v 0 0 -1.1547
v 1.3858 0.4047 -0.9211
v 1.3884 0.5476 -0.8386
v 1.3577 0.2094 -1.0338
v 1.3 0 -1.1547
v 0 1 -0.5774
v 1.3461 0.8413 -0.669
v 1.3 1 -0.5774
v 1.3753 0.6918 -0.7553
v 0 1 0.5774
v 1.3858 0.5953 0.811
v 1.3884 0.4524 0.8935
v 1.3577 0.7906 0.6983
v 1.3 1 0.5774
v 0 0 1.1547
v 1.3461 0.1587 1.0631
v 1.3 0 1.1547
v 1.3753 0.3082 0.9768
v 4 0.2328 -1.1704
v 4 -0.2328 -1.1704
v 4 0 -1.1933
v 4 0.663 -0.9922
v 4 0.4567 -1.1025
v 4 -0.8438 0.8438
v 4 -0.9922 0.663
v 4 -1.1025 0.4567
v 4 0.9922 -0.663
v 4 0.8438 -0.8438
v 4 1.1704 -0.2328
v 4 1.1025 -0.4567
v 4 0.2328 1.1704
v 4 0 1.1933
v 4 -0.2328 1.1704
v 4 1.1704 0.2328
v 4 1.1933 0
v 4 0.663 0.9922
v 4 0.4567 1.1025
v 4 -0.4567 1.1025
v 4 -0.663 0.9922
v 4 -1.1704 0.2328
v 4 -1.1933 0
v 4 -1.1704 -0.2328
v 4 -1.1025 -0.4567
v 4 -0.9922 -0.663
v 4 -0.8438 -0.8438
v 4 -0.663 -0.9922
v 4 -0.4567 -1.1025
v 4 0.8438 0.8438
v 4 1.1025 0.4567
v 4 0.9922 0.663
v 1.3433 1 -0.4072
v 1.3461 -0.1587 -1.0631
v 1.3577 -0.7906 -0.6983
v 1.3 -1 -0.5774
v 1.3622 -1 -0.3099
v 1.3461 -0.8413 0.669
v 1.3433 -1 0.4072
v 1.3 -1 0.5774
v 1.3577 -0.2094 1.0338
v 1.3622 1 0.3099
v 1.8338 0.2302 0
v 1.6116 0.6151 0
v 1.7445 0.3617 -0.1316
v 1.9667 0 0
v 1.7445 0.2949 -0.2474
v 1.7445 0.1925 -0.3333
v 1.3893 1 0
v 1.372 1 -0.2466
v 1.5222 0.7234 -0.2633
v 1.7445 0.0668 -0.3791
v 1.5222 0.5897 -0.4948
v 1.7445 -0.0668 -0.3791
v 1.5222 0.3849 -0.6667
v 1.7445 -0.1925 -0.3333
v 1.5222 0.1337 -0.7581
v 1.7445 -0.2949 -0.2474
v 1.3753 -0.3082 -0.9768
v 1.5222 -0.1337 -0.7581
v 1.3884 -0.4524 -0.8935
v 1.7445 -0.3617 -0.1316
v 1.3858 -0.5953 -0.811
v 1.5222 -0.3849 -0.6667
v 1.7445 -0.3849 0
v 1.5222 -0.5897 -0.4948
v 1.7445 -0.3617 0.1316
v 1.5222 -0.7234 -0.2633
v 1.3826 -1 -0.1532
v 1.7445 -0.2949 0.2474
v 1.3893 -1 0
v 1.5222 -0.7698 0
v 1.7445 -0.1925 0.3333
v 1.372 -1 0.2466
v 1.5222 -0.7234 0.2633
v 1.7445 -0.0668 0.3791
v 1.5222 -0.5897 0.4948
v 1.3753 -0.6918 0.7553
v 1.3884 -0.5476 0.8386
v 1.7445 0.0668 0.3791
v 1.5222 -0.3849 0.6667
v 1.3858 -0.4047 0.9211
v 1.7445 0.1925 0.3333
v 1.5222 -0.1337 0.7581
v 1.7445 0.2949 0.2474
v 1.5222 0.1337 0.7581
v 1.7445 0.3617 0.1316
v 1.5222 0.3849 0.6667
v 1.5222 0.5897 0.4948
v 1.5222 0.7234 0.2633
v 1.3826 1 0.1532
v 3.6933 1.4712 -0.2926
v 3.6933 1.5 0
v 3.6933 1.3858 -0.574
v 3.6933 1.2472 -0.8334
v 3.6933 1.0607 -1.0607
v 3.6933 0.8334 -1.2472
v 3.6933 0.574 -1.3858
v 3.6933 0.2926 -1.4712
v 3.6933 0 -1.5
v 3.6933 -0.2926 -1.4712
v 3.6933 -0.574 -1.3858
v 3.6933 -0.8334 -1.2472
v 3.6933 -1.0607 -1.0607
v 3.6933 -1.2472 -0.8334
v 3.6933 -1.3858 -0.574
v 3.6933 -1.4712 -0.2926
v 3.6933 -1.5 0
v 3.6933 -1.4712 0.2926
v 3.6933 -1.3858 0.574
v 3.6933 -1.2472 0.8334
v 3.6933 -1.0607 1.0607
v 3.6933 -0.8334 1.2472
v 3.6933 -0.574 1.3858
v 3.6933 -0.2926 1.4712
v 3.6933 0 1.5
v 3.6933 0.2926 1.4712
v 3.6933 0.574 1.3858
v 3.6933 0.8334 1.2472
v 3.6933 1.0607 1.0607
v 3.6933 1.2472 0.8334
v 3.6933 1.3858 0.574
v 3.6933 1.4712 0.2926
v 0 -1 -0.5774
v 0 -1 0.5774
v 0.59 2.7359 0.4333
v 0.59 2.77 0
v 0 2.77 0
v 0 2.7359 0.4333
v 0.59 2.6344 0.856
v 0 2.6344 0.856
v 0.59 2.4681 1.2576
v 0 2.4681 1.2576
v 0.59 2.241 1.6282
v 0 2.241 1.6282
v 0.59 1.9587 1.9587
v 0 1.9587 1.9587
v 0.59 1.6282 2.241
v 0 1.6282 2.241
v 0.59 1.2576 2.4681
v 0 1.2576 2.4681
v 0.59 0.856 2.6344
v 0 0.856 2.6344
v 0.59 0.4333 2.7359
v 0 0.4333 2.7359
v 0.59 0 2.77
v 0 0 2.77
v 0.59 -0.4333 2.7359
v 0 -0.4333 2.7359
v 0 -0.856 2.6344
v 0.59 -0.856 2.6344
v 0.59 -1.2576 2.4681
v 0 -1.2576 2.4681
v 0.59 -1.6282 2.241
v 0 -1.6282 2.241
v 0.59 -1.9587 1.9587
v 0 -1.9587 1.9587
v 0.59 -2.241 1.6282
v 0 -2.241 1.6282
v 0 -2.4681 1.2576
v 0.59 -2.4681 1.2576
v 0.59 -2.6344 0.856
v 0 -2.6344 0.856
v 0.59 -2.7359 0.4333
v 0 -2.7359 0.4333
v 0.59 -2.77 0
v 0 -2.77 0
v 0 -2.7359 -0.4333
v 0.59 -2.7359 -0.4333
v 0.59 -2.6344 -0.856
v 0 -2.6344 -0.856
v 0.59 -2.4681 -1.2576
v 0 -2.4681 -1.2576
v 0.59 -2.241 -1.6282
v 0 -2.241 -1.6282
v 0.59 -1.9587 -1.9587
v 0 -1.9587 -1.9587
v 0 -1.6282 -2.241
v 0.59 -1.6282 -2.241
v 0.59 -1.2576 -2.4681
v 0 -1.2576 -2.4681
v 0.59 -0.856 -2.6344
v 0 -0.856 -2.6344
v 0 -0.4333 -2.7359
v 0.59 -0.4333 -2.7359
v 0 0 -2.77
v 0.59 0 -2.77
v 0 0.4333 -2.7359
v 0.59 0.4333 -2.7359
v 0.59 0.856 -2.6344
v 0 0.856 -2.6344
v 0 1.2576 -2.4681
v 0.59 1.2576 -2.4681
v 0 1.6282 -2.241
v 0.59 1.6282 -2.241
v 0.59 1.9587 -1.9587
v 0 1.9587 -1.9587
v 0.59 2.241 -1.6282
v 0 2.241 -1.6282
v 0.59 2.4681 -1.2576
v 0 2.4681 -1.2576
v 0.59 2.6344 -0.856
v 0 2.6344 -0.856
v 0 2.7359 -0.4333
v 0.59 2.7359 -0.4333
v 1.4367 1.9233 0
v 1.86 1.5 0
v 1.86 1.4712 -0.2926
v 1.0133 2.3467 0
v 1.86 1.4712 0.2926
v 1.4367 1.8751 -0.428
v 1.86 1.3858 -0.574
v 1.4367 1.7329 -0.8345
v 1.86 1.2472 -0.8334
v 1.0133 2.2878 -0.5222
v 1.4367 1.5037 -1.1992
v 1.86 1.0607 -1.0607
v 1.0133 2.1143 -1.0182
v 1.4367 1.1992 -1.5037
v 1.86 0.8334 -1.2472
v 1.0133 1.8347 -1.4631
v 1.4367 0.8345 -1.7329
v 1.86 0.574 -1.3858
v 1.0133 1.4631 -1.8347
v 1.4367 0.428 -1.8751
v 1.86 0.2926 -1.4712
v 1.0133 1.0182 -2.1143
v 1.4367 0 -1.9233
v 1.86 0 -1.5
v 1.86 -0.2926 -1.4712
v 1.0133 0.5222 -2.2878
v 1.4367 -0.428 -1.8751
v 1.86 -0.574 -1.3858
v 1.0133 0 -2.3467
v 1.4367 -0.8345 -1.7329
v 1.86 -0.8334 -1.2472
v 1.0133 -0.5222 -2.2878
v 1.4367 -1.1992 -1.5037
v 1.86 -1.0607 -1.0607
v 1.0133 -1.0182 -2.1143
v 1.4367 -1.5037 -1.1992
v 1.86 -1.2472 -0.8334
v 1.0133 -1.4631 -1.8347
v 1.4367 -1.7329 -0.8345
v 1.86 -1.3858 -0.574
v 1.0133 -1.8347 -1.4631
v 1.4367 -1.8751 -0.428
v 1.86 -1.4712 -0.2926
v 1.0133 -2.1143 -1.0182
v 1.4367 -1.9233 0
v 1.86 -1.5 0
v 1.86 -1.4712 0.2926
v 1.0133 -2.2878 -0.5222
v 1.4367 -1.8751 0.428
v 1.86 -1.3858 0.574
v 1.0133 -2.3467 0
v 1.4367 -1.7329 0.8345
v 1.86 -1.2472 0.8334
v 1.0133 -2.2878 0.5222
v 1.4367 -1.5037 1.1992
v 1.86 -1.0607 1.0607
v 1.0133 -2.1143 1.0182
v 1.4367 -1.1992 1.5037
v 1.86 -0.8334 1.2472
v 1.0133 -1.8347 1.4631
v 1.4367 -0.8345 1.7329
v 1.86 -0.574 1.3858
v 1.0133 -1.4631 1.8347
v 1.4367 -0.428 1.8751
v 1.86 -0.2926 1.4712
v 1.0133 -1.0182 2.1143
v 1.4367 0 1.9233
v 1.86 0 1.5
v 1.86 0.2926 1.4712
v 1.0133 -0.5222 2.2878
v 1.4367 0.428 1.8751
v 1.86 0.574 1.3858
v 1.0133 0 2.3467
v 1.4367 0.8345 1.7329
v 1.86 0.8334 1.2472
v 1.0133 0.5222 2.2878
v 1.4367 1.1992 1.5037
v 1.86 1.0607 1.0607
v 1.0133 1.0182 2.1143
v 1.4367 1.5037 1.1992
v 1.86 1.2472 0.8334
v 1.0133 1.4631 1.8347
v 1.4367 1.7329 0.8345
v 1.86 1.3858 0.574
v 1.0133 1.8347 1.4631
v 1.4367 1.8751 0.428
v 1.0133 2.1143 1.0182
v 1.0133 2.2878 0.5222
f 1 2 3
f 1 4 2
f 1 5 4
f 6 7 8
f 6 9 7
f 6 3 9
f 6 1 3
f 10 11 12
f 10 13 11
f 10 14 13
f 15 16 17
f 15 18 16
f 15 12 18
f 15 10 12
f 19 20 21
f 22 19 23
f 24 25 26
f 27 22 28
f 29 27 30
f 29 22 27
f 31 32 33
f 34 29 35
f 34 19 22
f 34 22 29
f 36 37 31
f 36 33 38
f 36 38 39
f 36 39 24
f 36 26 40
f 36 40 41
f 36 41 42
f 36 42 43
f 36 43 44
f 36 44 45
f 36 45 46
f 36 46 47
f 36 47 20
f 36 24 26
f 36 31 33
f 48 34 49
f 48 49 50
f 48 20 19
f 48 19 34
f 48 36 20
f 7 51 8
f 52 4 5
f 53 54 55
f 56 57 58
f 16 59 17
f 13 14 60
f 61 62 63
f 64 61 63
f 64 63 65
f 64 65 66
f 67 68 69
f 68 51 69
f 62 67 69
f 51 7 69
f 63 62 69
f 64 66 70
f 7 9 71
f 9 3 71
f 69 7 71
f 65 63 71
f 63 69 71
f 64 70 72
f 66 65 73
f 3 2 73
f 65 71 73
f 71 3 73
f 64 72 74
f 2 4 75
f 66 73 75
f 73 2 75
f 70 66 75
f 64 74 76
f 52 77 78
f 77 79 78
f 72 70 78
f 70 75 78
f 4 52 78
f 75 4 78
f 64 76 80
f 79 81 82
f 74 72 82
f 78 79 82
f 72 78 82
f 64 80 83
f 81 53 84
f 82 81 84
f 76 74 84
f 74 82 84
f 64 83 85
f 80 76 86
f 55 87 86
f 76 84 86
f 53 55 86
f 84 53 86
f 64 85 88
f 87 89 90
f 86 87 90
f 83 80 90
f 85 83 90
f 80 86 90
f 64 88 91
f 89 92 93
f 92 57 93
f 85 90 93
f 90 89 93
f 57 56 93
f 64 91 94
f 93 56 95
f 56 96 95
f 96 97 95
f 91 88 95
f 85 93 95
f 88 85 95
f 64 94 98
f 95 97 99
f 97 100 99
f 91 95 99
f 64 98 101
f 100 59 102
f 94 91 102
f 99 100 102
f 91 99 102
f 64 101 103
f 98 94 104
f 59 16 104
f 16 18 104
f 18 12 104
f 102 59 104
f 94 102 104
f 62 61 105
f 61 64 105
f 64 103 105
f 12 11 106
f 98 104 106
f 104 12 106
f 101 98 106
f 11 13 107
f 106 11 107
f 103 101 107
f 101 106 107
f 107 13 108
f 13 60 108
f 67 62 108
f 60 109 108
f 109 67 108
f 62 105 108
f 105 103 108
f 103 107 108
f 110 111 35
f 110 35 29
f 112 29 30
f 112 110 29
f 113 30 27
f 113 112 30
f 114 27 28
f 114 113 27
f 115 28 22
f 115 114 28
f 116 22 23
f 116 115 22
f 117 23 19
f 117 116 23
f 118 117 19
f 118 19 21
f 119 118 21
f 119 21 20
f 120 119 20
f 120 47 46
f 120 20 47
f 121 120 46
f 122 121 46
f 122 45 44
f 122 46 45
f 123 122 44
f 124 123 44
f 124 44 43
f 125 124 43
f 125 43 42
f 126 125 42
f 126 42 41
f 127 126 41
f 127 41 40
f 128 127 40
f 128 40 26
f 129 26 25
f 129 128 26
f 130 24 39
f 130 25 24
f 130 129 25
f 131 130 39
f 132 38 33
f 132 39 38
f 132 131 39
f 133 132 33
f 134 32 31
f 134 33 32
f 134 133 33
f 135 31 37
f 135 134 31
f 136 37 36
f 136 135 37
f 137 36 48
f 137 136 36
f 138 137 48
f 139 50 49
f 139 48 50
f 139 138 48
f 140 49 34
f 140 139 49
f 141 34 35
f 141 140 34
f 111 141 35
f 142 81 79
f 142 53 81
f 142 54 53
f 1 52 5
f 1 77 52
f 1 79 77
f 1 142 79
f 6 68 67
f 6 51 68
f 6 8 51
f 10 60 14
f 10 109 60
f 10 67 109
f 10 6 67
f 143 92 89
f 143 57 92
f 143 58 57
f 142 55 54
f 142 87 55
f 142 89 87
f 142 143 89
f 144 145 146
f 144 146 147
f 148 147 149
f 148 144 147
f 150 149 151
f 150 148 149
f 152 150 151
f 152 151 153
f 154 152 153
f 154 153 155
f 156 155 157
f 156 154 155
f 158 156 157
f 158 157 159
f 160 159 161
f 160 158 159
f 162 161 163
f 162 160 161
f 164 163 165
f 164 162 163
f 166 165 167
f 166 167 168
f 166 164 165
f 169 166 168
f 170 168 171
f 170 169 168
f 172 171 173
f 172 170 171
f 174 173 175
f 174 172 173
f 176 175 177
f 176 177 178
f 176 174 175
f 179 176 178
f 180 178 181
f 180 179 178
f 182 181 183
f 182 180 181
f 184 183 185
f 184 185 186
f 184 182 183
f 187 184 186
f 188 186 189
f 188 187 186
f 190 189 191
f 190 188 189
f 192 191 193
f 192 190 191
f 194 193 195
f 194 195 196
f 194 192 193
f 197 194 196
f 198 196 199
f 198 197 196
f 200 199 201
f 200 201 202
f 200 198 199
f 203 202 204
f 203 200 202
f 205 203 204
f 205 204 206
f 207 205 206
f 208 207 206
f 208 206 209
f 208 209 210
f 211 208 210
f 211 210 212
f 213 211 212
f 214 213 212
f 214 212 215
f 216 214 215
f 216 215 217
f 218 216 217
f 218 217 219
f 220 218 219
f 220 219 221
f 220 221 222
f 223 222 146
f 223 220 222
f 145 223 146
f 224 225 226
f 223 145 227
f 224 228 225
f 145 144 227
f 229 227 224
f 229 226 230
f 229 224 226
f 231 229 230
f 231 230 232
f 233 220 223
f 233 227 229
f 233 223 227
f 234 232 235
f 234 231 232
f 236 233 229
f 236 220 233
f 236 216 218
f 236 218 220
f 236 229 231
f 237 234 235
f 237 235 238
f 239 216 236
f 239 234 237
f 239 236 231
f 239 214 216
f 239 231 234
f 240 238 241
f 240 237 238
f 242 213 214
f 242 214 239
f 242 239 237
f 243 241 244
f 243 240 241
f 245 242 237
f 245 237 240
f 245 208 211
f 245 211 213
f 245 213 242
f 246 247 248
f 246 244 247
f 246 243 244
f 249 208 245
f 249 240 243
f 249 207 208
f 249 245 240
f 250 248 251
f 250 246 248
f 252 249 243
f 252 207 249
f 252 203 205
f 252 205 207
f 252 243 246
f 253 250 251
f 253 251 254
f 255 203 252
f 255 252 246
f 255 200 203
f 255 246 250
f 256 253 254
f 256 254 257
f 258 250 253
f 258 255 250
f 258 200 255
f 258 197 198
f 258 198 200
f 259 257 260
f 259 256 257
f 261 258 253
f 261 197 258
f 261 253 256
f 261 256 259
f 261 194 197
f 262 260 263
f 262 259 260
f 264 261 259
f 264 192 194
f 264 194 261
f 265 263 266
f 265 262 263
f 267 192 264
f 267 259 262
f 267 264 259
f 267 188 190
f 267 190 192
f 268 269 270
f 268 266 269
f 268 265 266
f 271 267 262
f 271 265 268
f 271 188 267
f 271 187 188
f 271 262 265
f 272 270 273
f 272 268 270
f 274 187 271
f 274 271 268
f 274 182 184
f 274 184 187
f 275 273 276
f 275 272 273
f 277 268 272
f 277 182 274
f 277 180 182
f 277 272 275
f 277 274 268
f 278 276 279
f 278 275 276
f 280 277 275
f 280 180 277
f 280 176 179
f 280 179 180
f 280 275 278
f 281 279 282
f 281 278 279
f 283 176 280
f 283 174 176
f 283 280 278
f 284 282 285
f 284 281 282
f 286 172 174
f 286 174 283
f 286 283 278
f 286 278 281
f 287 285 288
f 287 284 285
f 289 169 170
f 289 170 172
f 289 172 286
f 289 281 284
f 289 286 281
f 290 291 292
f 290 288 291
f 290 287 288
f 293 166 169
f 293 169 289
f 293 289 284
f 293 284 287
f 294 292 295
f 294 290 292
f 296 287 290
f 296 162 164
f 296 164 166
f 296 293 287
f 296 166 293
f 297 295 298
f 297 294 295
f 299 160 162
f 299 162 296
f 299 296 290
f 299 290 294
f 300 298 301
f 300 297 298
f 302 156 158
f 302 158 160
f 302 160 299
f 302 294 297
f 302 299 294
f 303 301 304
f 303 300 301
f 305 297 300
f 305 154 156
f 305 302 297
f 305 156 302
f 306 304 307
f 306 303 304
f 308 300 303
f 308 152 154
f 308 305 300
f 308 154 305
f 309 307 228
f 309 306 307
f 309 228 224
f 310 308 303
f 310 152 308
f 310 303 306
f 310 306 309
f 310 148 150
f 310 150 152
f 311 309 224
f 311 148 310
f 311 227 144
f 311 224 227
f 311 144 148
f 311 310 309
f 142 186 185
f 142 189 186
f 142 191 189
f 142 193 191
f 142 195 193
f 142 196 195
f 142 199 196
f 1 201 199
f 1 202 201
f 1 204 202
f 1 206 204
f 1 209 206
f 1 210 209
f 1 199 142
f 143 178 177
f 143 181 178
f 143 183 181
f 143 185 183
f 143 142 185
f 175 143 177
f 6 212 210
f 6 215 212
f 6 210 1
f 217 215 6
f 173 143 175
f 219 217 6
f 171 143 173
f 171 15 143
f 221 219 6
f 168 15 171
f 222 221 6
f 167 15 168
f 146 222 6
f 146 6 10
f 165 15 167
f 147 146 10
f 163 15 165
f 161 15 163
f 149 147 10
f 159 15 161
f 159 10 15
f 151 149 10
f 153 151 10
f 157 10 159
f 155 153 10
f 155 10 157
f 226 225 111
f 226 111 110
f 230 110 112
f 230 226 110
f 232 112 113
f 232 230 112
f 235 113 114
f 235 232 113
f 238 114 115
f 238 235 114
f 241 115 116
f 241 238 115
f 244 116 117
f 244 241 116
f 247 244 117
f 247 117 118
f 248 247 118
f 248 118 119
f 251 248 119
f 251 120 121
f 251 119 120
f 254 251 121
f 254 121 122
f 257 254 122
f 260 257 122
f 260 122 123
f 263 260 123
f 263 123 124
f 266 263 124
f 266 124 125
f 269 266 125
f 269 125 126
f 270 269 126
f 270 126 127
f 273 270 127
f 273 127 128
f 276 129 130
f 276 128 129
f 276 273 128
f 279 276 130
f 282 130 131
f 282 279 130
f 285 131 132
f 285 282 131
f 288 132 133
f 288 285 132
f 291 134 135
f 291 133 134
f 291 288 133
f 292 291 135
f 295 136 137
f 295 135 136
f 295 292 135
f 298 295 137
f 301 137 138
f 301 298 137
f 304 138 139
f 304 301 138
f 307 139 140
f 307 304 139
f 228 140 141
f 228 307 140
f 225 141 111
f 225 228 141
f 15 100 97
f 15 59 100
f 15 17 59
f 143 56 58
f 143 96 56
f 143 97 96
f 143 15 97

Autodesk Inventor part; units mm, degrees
ref_plane "YZ Plane" through (0, 0, 0) normal (1, 0, 0) x (0, 1, 0)
ref_plane "XZ Plane" through (0, 0, 0) normal (0, 1, 0) x (-1, 0, 0)
sketch "Skizze1" plane through (0, 0, 0) normal (0, 0, 1) x (1, 0, 0)
  line L0 (4, 0) -> (4, 1.5)
  line L1 (4, 1.5) -> (3, 1.5)
  line L2 (3, 1.5) -> (2.6933, 1.5)
  line L3 (0, 2.77) -> (0, 1.1547)
  line L4 (0, 1.1547) -> (1.3, 1.1547)
  line L5 (1.3, 1.1547) -> (1.9667, 0)
  line L6 (1.9667, 0) -> (4, 0)
  line L7 (0, 2.77) -> (0.59, 2.77)
  line L8 (0.59, 2.77) -> (1.86, 1.5)
  line L9 (2.6933, 1.5) -> (1.86, 1.5)
  line L10 (3, 1.5) -> (1.86, 1.5) construction
  line L11 (1.86, 1.5) -> (1.86, 1.5)
  line L12 (-0.8, 0) -> (4.8, 0) projected
  line L13 (0, -0.554) -> (0, 3.324) projected
  dimension "d0" = 4
  dimension "d1" = 1
  dimension "d2" = 1.3
  dimension "d3" = 3
  dimension "d6" = 1.86
  dimension "d7" = 45
  dimension "d8" = 2.3094
  dimension "d9" = 60
  dimension "d10" = 5.54
  dimension "d11" = 3
  dimension "d12" = 0.3067
revolve "Körper" add sketch "Skizze1" angle 360 about axis through (1.9667, 0, 0) along (1, 0, 0) contours L6 L5 L4 L3 L7 L8 L9 L2 L1 L0
sketch "Skizze2" plane through (0, 0, 0) normal (-1, 0, 0) x (0, 0, 1)
  circle A0 centre (0, 0) radius 1.1547 projected
  line L0 (0, -3.878) -> (0, 3.878) projected
  line L1 (-3.878, 0) -> (3.878, 0) projected
  line L2 (1.1547, 0) -> (0.5774, -1)
  line L3 (0.5774, -1) -> (-0.5774, -1)
  line L4 (-0.5774, -1) -> (-1.1547, 0)
  line L5 (-1.1547, 0) -> (-0.5774, 1)
  line L6 (-0.5774, 1) -> (0.5774, 1)
  line L7 (0.5774, 1) -> (1.1547, 0)
  point P0 (0, 1.1547)
extrude "Loch" add sketch "Skizze2" against normal up to next contours L7 A0 | A0 L2 | L6 L0 A0 | A0 L0 L3 | L0 L6 A0 | A0 L3 L0 | L4 A0 | A0 L5
thread "Gewinde" size "M3x0.5" class "6g" standard "ISO Metric profile" length 4
chamfer "Fase1" distance 0.3067 distance2 0.3067 1 edges at (4, -1.5, 0) measured on face at (4, 0.6824, 0.2556)
ref_plane "Work Plane1" through (104.775, 0, 0) normal (0, 0, -1) x (1, 0, 0)
equation "\"d15\" = GEL"
equation "\"d17\" = -0.5 * SPD + 0.5 * GD"
equation "\"d18\" = GUL"
equation "\"d2\" = INTI"
equation "\"d3\" = GD"
equation "\"d6\" = KOH"
equation "\"d7\" = 0.5 * SEWI"
equation "\"d8\" = 1.1547 * SW"
equation "\"d10\" = KOD"
equation "\"d11\" = BDM"
equation "\"d12\" = GAL"
equation "\"NLG\" = 8"
equation "\"INTI\" = 1.3"
equation "\"GEL\" = 4"
equation "\"GAL\" = 0.61345 * PTC"
equation "\"KOH\" = 1.86"
equation "\"KOD\" = 5.54"
equation "\"GUL\" = 0.61345 * PTC"
equation "\"SPD\" = NND - 1.2269 * PTC"
equation "\"BDM\" = NND"
equation "\"GD\" = NND"
equation "\"SEWI\" = 90deg"
equation "\"SW\" = 2"
equation "\"TOA\" = 30deg"
equation "\"GD1\" = THREADDIA - 1.2269 * PTC"
equation "\"EPV\" = 3.36"
equation "\"THREADDIA\" = 3"
equation "\"PTC\" = 0.5"
equation "\"NND\" = 3"
equation "\"E0\" = 2.31"
equation "\"THREADDESC\" = 1.2345"
properties part number "ISO 10642 - M3 x  8" material "Stahl"
